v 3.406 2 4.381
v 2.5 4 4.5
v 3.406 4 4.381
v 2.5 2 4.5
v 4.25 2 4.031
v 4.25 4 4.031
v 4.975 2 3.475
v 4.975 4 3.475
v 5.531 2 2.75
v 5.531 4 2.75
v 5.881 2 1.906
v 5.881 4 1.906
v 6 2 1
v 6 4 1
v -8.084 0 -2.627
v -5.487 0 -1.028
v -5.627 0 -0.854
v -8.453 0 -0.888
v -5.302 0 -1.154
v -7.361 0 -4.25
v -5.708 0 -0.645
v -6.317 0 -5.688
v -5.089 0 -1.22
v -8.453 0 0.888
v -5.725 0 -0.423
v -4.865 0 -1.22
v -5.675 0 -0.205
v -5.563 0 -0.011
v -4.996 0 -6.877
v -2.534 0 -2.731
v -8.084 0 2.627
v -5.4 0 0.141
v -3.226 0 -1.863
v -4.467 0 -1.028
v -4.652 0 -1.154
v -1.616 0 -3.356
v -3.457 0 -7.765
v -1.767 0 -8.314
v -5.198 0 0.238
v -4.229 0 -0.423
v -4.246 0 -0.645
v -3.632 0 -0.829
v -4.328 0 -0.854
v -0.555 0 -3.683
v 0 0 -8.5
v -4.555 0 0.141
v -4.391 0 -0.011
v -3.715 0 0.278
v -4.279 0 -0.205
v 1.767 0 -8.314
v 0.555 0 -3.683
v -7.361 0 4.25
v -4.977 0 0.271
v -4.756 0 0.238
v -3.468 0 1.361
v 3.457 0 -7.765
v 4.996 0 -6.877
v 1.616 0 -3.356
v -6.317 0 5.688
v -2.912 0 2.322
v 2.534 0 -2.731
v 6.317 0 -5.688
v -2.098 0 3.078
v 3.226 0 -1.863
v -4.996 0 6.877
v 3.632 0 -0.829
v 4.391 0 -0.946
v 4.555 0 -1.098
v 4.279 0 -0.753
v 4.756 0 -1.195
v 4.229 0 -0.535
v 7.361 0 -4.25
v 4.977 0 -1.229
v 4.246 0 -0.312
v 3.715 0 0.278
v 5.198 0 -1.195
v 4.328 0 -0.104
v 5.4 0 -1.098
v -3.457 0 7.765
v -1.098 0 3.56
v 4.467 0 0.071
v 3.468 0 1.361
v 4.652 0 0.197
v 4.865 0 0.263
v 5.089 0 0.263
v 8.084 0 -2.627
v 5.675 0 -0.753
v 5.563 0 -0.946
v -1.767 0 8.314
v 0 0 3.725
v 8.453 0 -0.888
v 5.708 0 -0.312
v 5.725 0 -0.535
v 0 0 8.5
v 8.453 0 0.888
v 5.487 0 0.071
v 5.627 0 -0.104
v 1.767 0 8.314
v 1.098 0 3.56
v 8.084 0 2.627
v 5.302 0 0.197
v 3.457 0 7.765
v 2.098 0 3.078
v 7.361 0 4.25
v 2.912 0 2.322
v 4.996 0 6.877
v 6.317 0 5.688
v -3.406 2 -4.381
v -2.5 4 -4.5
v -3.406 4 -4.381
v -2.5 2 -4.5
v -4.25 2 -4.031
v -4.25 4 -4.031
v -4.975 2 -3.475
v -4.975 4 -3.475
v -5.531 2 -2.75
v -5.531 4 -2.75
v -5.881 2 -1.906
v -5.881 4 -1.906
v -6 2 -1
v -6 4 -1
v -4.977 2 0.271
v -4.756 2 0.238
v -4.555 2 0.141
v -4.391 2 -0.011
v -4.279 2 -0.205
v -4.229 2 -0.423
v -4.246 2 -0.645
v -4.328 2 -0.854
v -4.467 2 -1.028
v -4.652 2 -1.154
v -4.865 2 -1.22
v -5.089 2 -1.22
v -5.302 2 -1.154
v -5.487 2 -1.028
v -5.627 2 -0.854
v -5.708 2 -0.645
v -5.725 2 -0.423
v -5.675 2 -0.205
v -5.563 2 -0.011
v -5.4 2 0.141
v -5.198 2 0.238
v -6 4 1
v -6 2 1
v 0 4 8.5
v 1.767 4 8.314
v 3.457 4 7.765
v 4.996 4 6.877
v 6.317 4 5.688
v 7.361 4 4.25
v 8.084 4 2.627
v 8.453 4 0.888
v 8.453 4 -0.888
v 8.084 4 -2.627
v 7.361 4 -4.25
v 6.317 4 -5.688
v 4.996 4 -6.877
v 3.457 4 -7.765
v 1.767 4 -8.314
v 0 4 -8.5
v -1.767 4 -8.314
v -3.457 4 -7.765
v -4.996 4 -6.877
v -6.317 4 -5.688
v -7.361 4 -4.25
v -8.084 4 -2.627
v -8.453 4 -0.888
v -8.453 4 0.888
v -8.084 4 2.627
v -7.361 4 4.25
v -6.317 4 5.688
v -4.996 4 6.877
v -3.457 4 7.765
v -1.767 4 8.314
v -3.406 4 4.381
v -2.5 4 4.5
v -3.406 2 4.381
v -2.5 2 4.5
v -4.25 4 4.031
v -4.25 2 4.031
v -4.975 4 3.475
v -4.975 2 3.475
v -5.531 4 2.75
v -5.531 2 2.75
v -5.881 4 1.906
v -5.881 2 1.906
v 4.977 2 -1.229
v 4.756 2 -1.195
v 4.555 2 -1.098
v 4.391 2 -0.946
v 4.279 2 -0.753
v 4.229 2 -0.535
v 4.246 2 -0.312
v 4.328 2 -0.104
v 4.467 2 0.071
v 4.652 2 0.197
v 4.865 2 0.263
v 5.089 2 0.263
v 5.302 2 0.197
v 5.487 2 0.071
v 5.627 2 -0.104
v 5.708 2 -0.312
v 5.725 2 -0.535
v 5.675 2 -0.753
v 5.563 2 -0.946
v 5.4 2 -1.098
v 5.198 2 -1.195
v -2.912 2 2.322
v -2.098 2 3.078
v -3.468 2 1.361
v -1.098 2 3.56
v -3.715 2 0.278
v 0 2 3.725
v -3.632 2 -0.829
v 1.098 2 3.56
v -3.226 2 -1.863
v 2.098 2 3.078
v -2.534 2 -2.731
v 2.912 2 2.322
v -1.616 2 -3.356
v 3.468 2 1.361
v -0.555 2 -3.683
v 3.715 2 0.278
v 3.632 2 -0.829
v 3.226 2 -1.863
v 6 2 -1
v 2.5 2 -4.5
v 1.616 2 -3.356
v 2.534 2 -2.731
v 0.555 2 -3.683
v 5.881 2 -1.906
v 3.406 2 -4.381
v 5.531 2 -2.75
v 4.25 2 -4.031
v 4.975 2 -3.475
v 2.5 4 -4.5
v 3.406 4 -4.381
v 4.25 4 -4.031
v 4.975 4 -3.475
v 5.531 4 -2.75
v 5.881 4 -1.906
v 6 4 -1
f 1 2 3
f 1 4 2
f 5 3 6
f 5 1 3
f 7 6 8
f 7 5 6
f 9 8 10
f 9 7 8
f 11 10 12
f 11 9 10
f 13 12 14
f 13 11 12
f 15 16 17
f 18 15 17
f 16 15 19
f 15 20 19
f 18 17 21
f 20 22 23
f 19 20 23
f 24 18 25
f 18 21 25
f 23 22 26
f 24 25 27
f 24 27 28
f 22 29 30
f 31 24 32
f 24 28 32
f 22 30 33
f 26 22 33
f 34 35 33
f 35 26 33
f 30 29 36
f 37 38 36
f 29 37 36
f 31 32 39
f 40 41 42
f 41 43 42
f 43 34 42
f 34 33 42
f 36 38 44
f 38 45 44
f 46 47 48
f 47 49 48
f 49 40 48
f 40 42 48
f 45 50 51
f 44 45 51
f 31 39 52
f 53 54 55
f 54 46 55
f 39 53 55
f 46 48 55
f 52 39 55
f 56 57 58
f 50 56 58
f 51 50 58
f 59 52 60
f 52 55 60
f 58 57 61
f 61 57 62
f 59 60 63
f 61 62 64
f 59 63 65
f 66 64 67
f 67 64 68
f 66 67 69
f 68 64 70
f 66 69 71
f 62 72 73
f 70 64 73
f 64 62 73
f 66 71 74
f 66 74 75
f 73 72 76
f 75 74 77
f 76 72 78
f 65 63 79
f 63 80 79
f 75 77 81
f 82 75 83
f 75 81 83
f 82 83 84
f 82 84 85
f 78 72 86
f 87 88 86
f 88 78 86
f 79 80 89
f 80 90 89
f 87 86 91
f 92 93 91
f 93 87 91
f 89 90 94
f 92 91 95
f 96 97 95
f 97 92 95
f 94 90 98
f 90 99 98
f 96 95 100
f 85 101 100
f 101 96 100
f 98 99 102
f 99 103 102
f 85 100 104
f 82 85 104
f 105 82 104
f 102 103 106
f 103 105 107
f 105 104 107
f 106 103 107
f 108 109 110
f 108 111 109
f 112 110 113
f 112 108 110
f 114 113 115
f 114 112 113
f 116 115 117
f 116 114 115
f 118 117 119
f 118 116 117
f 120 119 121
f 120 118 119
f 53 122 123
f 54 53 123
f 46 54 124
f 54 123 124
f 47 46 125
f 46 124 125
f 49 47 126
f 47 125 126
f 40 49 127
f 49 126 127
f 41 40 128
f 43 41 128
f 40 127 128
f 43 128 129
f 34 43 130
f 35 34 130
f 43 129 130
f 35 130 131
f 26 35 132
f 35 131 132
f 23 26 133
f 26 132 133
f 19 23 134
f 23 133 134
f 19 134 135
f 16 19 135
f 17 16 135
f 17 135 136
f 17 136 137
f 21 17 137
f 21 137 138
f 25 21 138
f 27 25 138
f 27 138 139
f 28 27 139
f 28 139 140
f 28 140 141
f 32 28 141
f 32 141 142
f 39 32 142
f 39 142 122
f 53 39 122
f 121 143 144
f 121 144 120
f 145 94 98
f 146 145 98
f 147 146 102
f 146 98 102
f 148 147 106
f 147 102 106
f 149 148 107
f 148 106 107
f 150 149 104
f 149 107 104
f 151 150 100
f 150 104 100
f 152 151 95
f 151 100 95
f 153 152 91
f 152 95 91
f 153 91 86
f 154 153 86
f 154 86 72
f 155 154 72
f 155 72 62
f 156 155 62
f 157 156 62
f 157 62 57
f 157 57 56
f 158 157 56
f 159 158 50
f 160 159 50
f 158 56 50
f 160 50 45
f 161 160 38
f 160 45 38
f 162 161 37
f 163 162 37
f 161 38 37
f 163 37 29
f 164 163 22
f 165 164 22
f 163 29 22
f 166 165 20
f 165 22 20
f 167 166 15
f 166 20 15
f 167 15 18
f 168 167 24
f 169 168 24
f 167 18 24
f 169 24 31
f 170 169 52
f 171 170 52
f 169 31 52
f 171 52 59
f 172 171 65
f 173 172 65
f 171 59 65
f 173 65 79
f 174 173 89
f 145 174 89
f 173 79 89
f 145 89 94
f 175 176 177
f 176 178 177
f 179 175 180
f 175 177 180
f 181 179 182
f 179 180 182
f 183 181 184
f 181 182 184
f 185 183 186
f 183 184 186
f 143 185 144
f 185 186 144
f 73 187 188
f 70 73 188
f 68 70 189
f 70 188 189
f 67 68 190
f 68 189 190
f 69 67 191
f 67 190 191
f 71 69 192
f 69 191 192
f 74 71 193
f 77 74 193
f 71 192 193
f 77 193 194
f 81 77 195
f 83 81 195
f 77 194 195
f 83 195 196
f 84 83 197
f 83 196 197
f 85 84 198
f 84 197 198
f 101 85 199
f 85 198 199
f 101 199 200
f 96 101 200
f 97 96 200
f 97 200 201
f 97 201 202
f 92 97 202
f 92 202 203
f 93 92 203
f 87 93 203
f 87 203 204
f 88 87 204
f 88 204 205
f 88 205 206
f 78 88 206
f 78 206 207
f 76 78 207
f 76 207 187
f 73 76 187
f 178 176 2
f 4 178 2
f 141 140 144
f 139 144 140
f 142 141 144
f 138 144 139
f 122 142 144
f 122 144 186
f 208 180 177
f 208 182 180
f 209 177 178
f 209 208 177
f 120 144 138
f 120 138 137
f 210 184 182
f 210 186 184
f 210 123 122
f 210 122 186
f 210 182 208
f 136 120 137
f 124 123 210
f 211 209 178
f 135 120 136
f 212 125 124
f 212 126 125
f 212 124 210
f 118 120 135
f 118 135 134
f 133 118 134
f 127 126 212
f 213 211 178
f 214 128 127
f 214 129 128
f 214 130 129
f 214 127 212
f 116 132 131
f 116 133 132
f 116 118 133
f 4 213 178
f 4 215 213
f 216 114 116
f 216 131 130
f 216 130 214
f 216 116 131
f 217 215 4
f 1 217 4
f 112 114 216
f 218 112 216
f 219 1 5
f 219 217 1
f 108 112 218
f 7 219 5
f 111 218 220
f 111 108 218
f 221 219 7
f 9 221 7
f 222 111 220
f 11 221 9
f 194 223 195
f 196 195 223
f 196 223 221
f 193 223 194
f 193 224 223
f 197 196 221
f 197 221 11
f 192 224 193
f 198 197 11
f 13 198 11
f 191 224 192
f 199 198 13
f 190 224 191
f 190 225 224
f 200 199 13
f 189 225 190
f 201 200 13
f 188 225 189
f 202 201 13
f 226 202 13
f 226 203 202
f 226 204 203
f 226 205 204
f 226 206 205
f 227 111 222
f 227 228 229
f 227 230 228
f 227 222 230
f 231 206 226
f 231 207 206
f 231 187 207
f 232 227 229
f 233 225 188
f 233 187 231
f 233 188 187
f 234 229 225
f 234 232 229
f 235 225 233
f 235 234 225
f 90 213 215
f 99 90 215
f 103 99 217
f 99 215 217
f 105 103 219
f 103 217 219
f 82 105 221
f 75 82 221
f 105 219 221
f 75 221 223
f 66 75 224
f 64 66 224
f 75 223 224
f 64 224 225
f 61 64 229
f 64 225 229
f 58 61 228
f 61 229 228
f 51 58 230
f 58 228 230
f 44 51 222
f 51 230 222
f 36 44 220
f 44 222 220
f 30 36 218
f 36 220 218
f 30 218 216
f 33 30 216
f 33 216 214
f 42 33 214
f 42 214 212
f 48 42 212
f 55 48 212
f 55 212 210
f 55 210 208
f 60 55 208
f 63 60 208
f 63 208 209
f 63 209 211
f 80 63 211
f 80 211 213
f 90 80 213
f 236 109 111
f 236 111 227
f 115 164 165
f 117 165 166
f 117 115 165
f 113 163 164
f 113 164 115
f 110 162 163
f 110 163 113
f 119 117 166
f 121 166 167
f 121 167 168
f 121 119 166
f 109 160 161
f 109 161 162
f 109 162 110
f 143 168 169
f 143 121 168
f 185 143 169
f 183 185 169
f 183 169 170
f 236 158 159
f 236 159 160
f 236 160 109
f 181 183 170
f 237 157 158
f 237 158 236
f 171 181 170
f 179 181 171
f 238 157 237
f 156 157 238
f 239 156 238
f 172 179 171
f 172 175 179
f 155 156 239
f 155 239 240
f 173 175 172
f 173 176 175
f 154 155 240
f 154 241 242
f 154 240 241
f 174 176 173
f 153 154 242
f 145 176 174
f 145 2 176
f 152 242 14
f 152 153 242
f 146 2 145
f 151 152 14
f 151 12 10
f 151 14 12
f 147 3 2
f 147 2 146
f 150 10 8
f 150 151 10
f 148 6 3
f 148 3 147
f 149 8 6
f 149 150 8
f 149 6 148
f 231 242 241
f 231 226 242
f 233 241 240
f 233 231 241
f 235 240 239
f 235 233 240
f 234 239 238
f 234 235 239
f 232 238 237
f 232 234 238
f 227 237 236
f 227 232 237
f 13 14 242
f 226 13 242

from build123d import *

# Parameters (mm, degrees)
SKETCH2_R           = 8.5
BOSS_EXTRUDE1_DEPTH = 4
SKETCH3_W           = 12
SKETCH3_H           = 9
CUT_EXTRUDE1_DEPTH  = 2
FILLET1_R           = 3.5
SKETCH4_R           = 3.725
SKETCH4_R_2         = 0.75
CUT_EXTRUDE2_DEPTH  = 13.186057607


with BuildPart() as part:
    # Sketch2 → Boss-Extrude1 (new body)
    with BuildSketch(Plane(origin=(0, 0, 0), x_dir=(1, 0, 0), z_dir=(0, 1, 0))):
        with Locations(Location((0, 0, 0), (0, 0, 270))):
            Circle(SKETCH2_R)
    extrude(amount=BOSS_EXTRUDE1_DEPTH)

    # Sketch3 → Cut-Extrude1 (cut)
    with BuildSketch(Plane(origin=(0, 4, 0), x_dir=(1, 0, 0), z_dir=(0, 1, 0))):
        Rectangle(SKETCH3_W, SKETCH3_H)
    extrude(amount=-CUT_EXTRUDE1_DEPTH, mode=Mode.SUBTRACT)

    # Fillet1
    fillet1_edges = [part.edges().sort_by_distance(p)[0] for p in [
        (6, 3, -4.5),
        (6, 3, 4.5),
        (-6, 3, 4.5),
        (-6, 3, -4.5),
    ]]
    fillet(fillet1_edges, radius=FILLET1_R)

    # Sketch4 → Cut-Extrude2 (cut, through all)
    with BuildSketch(Plane(origin=(0, 2, 0), x_dir=(1, 0, 0), z_dir=(0, 1, 0))):
        with Locations(Location((0, 0, 0), (0, 0, 270))):
            Circle(SKETCH4_R)
        with Locations(Location((-4.977045146, 0.478562033, 0), (0, 0, 270))):
            Circle(SKETCH4_R_2)
        with Locations(Location((4.977045146, 0.478562033, 0), (0, 0, 90))):
            Circle(SKETCH4_R_2)
    extrude(amount=-CUT_EXTRUDE2_DEPTH, mode=Mode.SUBTRACT)


solid = part.part
